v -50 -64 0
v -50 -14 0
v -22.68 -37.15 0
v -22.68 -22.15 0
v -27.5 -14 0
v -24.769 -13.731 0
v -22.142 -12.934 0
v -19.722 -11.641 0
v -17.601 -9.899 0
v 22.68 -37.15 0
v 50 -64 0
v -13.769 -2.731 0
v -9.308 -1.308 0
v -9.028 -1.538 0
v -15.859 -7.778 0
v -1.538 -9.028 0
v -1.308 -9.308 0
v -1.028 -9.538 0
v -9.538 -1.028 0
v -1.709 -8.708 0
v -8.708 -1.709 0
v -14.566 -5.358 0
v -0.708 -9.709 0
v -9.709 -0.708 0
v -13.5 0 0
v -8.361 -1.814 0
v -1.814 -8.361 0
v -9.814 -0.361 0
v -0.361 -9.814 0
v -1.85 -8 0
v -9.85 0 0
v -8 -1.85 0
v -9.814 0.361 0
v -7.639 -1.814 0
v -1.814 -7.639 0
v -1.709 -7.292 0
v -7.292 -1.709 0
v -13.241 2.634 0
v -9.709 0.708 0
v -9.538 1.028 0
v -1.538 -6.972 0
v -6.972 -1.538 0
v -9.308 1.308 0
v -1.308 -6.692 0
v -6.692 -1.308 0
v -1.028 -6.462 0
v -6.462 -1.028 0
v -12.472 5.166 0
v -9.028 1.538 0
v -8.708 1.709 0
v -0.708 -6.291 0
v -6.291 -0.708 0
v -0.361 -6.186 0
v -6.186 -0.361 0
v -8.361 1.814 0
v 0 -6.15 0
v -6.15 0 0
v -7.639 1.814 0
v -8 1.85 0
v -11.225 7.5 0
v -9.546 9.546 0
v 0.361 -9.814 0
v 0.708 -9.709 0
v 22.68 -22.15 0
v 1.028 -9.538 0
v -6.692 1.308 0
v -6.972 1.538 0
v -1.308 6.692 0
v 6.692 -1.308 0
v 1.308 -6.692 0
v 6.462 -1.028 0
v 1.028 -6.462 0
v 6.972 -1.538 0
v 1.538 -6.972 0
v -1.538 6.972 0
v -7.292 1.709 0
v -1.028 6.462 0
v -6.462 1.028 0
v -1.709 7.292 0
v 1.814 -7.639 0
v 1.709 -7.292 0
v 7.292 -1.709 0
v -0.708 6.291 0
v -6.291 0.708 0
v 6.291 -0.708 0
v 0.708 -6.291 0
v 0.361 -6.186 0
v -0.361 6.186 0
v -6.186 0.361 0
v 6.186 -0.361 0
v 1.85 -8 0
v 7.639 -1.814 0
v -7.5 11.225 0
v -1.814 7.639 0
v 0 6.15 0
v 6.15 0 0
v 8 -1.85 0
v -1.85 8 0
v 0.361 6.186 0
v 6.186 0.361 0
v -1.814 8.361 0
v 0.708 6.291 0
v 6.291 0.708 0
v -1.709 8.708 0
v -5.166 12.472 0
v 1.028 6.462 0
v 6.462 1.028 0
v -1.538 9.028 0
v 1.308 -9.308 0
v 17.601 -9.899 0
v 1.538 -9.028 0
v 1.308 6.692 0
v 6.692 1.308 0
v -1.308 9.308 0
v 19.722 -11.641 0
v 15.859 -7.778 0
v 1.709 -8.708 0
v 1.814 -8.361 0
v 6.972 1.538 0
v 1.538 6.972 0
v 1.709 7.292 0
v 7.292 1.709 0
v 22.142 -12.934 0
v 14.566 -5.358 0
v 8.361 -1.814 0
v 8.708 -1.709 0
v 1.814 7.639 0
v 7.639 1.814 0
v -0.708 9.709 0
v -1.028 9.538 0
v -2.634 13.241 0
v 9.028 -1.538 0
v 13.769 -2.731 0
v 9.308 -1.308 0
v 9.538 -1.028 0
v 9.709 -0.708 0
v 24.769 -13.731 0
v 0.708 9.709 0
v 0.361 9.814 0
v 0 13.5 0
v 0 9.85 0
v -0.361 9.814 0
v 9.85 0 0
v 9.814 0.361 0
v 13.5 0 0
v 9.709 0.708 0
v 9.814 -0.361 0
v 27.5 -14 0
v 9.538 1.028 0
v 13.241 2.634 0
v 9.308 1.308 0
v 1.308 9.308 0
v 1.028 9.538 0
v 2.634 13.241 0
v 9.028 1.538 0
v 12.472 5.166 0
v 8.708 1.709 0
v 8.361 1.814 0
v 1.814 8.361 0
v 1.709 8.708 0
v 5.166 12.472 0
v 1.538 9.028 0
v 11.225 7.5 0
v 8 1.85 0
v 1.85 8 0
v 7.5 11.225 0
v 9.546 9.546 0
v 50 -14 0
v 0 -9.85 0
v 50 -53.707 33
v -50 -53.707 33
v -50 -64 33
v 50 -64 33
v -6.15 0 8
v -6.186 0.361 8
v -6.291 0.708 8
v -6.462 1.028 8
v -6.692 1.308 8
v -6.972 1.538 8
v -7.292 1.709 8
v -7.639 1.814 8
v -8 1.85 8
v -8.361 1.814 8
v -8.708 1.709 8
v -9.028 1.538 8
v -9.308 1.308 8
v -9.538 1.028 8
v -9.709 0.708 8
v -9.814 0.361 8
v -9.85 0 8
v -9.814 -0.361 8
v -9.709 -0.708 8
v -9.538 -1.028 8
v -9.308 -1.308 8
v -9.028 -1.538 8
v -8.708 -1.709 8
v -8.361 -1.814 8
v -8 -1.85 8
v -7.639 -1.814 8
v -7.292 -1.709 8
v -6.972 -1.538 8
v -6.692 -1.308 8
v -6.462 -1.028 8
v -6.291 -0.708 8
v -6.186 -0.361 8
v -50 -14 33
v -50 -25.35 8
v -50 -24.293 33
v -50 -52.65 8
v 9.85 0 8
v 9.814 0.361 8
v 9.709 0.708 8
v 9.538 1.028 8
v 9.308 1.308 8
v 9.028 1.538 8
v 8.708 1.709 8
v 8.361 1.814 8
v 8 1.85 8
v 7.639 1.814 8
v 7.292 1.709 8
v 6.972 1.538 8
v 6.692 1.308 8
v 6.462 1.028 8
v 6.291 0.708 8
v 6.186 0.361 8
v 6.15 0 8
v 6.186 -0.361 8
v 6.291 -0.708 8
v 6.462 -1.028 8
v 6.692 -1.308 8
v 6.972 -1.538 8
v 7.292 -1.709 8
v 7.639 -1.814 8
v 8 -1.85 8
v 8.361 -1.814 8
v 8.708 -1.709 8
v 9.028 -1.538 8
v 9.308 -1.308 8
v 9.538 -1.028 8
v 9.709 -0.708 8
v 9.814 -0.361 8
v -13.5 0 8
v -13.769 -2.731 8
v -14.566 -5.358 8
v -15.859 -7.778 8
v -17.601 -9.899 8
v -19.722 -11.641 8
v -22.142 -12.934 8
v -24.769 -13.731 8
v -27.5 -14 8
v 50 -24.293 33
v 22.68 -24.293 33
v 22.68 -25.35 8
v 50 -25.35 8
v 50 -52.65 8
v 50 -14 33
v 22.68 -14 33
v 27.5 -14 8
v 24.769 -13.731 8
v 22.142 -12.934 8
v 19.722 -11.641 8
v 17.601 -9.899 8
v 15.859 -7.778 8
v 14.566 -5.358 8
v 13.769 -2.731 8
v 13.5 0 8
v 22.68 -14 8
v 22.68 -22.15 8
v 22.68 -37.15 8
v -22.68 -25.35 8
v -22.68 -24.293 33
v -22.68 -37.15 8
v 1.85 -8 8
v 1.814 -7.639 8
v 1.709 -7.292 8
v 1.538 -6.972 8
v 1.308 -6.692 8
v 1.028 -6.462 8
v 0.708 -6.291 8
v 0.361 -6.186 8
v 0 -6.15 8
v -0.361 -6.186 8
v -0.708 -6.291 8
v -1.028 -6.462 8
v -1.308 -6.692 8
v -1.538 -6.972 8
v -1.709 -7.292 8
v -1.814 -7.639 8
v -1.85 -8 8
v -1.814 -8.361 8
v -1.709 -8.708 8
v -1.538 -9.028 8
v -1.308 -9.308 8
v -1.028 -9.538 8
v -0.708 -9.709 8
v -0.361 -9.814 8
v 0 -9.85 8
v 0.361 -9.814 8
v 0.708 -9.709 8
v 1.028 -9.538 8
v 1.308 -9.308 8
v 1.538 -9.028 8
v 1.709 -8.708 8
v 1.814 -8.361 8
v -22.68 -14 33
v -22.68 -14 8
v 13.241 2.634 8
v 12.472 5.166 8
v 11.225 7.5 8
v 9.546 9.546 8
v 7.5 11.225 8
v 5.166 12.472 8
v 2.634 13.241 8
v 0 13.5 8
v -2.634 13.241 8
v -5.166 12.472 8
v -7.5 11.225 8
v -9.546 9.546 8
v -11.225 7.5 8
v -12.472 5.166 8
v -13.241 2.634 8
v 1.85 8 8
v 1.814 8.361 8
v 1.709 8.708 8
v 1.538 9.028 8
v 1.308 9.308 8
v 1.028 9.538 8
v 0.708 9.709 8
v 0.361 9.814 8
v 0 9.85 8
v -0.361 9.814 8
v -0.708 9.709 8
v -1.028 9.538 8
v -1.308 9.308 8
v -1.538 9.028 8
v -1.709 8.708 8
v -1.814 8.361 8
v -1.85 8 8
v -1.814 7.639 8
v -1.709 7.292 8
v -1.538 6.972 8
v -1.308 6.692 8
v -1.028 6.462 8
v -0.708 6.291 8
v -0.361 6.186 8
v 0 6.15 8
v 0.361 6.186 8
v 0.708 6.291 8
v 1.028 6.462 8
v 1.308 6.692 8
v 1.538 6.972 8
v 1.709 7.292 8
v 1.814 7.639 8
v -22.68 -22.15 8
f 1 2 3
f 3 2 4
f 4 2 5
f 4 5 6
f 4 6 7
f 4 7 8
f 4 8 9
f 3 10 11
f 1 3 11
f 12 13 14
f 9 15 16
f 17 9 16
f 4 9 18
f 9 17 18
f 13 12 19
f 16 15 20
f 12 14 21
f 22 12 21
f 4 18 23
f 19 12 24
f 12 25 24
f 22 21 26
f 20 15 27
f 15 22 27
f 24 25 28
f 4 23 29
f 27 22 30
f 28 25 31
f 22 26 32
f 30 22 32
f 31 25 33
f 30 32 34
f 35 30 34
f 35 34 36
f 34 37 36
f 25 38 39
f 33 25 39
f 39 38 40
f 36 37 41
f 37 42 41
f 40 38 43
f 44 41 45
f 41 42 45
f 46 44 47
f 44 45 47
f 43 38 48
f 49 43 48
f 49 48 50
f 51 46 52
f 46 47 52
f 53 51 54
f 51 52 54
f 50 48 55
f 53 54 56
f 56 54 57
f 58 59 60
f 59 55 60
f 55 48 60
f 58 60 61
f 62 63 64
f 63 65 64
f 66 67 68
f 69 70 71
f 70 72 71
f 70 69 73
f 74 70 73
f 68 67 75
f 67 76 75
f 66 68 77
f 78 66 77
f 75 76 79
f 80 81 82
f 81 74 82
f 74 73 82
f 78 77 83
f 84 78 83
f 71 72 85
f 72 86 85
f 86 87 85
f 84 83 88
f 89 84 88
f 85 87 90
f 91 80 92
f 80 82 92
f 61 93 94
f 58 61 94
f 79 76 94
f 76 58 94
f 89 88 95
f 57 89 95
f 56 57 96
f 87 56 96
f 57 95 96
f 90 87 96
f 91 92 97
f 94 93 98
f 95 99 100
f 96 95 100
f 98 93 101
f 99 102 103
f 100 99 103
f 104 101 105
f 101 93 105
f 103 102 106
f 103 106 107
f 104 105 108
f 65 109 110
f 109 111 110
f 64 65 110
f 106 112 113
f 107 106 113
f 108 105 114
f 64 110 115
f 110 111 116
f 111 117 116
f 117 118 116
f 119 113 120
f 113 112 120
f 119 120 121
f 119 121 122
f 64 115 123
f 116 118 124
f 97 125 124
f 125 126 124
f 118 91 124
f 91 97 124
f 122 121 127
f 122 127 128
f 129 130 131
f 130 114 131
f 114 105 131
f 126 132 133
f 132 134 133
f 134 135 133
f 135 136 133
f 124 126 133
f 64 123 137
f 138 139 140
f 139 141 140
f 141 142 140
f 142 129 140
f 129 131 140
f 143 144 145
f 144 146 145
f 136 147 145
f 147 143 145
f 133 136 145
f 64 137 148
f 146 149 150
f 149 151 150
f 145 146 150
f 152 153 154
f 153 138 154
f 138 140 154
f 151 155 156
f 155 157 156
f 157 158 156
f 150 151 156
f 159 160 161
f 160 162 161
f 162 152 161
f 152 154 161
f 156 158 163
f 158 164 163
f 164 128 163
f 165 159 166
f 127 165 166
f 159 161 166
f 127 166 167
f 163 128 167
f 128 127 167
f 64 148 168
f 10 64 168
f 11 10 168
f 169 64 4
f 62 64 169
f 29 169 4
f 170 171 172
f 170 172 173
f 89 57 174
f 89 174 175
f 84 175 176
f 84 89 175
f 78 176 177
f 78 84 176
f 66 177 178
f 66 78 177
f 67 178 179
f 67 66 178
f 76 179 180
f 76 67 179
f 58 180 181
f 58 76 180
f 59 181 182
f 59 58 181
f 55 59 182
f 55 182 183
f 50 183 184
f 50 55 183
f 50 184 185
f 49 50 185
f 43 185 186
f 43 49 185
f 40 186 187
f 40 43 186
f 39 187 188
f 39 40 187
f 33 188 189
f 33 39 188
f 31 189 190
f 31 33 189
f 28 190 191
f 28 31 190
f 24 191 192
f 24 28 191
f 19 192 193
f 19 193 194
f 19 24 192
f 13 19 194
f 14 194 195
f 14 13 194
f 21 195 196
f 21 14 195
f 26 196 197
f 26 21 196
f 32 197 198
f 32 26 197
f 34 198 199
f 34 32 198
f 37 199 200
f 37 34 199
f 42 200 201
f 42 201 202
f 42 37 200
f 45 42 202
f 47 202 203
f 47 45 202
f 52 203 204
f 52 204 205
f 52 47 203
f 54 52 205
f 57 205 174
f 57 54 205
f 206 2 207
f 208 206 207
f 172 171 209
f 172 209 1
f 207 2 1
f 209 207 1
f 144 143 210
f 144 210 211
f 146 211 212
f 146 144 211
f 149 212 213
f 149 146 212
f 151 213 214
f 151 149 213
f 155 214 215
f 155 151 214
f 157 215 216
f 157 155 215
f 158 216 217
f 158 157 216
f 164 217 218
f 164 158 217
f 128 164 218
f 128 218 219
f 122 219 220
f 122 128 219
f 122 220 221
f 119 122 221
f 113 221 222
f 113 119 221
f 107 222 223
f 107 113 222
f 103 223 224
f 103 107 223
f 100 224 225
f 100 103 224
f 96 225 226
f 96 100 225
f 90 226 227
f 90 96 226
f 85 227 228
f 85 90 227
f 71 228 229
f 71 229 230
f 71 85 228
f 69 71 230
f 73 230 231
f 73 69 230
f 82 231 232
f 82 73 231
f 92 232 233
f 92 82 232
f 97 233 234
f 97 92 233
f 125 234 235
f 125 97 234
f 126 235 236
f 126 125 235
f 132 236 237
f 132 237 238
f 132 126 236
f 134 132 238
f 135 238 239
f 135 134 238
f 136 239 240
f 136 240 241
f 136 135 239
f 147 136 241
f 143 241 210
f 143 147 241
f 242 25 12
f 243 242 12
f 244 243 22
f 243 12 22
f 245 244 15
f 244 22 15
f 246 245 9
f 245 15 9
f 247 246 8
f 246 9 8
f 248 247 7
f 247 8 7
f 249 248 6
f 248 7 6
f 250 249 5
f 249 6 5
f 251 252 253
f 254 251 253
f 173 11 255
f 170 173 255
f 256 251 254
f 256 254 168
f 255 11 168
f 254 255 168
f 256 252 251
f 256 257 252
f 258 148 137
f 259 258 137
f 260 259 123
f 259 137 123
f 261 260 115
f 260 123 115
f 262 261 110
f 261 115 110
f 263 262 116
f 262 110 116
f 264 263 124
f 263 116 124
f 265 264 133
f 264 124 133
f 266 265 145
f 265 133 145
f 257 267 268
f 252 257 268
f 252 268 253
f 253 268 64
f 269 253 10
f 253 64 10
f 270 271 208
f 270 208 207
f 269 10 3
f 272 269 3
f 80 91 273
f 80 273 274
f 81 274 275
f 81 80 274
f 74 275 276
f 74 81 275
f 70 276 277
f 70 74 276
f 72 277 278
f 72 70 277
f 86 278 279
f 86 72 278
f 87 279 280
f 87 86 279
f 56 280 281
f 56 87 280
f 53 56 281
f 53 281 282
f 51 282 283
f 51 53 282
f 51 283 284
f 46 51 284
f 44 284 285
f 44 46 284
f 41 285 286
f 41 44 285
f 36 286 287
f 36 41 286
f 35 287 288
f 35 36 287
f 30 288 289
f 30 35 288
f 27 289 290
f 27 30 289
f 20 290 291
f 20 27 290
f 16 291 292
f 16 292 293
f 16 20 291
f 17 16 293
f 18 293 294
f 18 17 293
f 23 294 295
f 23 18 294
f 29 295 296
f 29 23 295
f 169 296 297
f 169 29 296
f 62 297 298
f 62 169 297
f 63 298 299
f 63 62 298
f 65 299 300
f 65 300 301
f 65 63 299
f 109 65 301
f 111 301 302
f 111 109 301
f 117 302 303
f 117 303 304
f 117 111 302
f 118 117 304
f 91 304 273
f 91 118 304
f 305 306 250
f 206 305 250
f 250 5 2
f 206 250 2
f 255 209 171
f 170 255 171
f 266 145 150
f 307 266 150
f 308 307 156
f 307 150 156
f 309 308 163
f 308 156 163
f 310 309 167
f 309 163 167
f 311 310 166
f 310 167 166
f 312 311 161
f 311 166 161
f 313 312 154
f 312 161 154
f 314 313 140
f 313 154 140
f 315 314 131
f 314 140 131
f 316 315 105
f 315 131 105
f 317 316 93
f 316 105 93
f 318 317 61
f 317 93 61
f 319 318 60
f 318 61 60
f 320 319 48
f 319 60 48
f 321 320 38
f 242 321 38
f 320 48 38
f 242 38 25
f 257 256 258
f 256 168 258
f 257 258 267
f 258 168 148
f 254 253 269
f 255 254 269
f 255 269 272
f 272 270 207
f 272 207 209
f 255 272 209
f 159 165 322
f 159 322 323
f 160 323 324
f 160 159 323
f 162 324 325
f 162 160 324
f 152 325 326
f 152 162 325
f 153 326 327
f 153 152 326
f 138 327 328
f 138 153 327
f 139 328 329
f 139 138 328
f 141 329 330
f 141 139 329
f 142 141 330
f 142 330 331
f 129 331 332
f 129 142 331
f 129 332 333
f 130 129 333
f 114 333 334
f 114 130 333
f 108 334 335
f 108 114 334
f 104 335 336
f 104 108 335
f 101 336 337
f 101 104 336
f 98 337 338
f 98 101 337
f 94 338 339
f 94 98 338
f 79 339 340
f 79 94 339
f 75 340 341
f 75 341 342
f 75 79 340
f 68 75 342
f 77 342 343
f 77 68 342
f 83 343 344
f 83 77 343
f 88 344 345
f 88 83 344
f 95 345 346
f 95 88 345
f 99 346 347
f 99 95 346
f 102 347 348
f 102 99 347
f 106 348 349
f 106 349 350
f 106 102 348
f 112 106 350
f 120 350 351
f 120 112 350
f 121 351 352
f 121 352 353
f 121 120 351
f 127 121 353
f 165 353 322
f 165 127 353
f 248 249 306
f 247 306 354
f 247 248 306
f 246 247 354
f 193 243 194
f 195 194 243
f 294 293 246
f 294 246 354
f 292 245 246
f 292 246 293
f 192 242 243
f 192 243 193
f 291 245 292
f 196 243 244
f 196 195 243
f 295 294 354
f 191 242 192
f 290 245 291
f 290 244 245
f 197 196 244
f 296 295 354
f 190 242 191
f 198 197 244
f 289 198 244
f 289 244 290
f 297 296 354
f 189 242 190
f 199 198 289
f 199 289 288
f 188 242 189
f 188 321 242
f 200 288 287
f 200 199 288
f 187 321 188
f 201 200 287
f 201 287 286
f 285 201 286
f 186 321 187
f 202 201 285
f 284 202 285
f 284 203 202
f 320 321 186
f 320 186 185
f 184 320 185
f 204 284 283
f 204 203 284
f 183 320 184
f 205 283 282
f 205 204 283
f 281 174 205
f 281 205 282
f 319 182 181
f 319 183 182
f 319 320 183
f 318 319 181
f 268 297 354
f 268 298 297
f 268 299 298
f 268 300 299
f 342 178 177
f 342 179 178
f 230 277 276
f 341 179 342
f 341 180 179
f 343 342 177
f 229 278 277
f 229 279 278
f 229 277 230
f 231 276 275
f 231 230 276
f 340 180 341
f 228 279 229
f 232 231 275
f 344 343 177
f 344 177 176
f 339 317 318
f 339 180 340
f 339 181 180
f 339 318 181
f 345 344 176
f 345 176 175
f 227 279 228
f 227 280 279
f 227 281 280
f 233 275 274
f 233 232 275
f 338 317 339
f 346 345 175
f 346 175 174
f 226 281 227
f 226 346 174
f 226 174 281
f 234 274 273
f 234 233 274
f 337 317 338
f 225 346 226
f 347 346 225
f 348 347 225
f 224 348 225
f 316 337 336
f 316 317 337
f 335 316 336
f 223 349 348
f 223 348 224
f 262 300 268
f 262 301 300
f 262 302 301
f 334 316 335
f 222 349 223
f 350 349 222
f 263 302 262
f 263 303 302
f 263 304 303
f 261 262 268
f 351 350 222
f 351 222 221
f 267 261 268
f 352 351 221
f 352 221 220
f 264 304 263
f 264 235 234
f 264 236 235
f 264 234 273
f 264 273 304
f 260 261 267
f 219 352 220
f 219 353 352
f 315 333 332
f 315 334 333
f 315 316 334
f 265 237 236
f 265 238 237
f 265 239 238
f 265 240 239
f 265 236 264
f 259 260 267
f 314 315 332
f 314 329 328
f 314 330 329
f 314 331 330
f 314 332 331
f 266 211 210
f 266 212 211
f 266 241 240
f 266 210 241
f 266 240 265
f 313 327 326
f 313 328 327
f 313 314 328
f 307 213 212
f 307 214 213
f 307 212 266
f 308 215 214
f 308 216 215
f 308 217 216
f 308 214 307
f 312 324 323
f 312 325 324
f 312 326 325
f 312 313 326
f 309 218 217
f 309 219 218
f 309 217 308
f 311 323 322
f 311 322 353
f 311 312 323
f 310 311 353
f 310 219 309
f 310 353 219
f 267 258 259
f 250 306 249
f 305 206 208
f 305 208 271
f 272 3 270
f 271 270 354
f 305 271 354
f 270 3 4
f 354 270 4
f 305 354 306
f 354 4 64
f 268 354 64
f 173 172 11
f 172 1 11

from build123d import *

# Parameters (mm, degrees)
F0_W     = 45.36
F0_H     = 15
F0_R     = 1.85
F1_DEPTH = 8
F3_DEPTH = 25
F5_DEPTH = 100


with BuildPart() as f1:
    # F0 (on Top) → F1 (new body)
    with BuildSketch(Plane.XY):
        with BuildLine():
            ThreePointArc((27.5, -14), (17.600505, -9.899495), (13.5, 0))
            ThreePointArc((13.5, 0), (0, 13.5), (-13.5, 0))
            ThreePointArc((-13.5, 0), (-17.600505, -9.899495), (-27.5, -14))
            Line((-27.5, -14), (-50, -14))
            Line((-50, -14), (-50, -64))
            Line((-50, -64), (50, -64))
            Line((50, -64), (50, -14))
            Line((50, -14), (27.5, -14))
        make_face()
        with Locations((0, -29.65)):
            Rectangle(F0_W, F0_H, mode=Mode.SUBTRACT)
        with Locations((-8, 0)):
            Circle(F0_R, mode=Mode.SUBTRACT)
        with Locations((0, -8)):
            Circle(F0_R, mode=Mode.SUBTRACT)
        with Locations((8, 0)):
            Circle(F0_R, mode=Mode.SUBTRACT)
        with Locations((0, 8)):
            Circle(F0_R, mode=Mode.SUBTRACT)
    extrude(amount=F1_DEPTH)

    # F2 (on face) → F3 (join)
    with BuildSketch(Plane.XY.offset(8)):
        Polygon((-27.5, -14), (-50, -14), (-50, -64), (50, -64), (50, -14), (27.5, -14), (22.68, -14), (22.68, -22.15), (22.68, -37.15), (-22.68, -37.15), (-22.68, -22.15), (-22.68, -14), align=None)
    extrude(amount=F3_DEPTH)

    # F4 (on face) → F5 (cut, through all)
    with BuildSketch(Plane(origin=(-50, 0, 0), x_dir=(0, -1, 0), z_dir=(-1, 0, 0))):
        Polygon((24.292708, 33), (25.35, 8), (52.65, 8), (53.707292, 33), align=None)
    extrude(amount=-F5_DEPTH, mode=Mode.SUBTRACT)


solid = f1.part
